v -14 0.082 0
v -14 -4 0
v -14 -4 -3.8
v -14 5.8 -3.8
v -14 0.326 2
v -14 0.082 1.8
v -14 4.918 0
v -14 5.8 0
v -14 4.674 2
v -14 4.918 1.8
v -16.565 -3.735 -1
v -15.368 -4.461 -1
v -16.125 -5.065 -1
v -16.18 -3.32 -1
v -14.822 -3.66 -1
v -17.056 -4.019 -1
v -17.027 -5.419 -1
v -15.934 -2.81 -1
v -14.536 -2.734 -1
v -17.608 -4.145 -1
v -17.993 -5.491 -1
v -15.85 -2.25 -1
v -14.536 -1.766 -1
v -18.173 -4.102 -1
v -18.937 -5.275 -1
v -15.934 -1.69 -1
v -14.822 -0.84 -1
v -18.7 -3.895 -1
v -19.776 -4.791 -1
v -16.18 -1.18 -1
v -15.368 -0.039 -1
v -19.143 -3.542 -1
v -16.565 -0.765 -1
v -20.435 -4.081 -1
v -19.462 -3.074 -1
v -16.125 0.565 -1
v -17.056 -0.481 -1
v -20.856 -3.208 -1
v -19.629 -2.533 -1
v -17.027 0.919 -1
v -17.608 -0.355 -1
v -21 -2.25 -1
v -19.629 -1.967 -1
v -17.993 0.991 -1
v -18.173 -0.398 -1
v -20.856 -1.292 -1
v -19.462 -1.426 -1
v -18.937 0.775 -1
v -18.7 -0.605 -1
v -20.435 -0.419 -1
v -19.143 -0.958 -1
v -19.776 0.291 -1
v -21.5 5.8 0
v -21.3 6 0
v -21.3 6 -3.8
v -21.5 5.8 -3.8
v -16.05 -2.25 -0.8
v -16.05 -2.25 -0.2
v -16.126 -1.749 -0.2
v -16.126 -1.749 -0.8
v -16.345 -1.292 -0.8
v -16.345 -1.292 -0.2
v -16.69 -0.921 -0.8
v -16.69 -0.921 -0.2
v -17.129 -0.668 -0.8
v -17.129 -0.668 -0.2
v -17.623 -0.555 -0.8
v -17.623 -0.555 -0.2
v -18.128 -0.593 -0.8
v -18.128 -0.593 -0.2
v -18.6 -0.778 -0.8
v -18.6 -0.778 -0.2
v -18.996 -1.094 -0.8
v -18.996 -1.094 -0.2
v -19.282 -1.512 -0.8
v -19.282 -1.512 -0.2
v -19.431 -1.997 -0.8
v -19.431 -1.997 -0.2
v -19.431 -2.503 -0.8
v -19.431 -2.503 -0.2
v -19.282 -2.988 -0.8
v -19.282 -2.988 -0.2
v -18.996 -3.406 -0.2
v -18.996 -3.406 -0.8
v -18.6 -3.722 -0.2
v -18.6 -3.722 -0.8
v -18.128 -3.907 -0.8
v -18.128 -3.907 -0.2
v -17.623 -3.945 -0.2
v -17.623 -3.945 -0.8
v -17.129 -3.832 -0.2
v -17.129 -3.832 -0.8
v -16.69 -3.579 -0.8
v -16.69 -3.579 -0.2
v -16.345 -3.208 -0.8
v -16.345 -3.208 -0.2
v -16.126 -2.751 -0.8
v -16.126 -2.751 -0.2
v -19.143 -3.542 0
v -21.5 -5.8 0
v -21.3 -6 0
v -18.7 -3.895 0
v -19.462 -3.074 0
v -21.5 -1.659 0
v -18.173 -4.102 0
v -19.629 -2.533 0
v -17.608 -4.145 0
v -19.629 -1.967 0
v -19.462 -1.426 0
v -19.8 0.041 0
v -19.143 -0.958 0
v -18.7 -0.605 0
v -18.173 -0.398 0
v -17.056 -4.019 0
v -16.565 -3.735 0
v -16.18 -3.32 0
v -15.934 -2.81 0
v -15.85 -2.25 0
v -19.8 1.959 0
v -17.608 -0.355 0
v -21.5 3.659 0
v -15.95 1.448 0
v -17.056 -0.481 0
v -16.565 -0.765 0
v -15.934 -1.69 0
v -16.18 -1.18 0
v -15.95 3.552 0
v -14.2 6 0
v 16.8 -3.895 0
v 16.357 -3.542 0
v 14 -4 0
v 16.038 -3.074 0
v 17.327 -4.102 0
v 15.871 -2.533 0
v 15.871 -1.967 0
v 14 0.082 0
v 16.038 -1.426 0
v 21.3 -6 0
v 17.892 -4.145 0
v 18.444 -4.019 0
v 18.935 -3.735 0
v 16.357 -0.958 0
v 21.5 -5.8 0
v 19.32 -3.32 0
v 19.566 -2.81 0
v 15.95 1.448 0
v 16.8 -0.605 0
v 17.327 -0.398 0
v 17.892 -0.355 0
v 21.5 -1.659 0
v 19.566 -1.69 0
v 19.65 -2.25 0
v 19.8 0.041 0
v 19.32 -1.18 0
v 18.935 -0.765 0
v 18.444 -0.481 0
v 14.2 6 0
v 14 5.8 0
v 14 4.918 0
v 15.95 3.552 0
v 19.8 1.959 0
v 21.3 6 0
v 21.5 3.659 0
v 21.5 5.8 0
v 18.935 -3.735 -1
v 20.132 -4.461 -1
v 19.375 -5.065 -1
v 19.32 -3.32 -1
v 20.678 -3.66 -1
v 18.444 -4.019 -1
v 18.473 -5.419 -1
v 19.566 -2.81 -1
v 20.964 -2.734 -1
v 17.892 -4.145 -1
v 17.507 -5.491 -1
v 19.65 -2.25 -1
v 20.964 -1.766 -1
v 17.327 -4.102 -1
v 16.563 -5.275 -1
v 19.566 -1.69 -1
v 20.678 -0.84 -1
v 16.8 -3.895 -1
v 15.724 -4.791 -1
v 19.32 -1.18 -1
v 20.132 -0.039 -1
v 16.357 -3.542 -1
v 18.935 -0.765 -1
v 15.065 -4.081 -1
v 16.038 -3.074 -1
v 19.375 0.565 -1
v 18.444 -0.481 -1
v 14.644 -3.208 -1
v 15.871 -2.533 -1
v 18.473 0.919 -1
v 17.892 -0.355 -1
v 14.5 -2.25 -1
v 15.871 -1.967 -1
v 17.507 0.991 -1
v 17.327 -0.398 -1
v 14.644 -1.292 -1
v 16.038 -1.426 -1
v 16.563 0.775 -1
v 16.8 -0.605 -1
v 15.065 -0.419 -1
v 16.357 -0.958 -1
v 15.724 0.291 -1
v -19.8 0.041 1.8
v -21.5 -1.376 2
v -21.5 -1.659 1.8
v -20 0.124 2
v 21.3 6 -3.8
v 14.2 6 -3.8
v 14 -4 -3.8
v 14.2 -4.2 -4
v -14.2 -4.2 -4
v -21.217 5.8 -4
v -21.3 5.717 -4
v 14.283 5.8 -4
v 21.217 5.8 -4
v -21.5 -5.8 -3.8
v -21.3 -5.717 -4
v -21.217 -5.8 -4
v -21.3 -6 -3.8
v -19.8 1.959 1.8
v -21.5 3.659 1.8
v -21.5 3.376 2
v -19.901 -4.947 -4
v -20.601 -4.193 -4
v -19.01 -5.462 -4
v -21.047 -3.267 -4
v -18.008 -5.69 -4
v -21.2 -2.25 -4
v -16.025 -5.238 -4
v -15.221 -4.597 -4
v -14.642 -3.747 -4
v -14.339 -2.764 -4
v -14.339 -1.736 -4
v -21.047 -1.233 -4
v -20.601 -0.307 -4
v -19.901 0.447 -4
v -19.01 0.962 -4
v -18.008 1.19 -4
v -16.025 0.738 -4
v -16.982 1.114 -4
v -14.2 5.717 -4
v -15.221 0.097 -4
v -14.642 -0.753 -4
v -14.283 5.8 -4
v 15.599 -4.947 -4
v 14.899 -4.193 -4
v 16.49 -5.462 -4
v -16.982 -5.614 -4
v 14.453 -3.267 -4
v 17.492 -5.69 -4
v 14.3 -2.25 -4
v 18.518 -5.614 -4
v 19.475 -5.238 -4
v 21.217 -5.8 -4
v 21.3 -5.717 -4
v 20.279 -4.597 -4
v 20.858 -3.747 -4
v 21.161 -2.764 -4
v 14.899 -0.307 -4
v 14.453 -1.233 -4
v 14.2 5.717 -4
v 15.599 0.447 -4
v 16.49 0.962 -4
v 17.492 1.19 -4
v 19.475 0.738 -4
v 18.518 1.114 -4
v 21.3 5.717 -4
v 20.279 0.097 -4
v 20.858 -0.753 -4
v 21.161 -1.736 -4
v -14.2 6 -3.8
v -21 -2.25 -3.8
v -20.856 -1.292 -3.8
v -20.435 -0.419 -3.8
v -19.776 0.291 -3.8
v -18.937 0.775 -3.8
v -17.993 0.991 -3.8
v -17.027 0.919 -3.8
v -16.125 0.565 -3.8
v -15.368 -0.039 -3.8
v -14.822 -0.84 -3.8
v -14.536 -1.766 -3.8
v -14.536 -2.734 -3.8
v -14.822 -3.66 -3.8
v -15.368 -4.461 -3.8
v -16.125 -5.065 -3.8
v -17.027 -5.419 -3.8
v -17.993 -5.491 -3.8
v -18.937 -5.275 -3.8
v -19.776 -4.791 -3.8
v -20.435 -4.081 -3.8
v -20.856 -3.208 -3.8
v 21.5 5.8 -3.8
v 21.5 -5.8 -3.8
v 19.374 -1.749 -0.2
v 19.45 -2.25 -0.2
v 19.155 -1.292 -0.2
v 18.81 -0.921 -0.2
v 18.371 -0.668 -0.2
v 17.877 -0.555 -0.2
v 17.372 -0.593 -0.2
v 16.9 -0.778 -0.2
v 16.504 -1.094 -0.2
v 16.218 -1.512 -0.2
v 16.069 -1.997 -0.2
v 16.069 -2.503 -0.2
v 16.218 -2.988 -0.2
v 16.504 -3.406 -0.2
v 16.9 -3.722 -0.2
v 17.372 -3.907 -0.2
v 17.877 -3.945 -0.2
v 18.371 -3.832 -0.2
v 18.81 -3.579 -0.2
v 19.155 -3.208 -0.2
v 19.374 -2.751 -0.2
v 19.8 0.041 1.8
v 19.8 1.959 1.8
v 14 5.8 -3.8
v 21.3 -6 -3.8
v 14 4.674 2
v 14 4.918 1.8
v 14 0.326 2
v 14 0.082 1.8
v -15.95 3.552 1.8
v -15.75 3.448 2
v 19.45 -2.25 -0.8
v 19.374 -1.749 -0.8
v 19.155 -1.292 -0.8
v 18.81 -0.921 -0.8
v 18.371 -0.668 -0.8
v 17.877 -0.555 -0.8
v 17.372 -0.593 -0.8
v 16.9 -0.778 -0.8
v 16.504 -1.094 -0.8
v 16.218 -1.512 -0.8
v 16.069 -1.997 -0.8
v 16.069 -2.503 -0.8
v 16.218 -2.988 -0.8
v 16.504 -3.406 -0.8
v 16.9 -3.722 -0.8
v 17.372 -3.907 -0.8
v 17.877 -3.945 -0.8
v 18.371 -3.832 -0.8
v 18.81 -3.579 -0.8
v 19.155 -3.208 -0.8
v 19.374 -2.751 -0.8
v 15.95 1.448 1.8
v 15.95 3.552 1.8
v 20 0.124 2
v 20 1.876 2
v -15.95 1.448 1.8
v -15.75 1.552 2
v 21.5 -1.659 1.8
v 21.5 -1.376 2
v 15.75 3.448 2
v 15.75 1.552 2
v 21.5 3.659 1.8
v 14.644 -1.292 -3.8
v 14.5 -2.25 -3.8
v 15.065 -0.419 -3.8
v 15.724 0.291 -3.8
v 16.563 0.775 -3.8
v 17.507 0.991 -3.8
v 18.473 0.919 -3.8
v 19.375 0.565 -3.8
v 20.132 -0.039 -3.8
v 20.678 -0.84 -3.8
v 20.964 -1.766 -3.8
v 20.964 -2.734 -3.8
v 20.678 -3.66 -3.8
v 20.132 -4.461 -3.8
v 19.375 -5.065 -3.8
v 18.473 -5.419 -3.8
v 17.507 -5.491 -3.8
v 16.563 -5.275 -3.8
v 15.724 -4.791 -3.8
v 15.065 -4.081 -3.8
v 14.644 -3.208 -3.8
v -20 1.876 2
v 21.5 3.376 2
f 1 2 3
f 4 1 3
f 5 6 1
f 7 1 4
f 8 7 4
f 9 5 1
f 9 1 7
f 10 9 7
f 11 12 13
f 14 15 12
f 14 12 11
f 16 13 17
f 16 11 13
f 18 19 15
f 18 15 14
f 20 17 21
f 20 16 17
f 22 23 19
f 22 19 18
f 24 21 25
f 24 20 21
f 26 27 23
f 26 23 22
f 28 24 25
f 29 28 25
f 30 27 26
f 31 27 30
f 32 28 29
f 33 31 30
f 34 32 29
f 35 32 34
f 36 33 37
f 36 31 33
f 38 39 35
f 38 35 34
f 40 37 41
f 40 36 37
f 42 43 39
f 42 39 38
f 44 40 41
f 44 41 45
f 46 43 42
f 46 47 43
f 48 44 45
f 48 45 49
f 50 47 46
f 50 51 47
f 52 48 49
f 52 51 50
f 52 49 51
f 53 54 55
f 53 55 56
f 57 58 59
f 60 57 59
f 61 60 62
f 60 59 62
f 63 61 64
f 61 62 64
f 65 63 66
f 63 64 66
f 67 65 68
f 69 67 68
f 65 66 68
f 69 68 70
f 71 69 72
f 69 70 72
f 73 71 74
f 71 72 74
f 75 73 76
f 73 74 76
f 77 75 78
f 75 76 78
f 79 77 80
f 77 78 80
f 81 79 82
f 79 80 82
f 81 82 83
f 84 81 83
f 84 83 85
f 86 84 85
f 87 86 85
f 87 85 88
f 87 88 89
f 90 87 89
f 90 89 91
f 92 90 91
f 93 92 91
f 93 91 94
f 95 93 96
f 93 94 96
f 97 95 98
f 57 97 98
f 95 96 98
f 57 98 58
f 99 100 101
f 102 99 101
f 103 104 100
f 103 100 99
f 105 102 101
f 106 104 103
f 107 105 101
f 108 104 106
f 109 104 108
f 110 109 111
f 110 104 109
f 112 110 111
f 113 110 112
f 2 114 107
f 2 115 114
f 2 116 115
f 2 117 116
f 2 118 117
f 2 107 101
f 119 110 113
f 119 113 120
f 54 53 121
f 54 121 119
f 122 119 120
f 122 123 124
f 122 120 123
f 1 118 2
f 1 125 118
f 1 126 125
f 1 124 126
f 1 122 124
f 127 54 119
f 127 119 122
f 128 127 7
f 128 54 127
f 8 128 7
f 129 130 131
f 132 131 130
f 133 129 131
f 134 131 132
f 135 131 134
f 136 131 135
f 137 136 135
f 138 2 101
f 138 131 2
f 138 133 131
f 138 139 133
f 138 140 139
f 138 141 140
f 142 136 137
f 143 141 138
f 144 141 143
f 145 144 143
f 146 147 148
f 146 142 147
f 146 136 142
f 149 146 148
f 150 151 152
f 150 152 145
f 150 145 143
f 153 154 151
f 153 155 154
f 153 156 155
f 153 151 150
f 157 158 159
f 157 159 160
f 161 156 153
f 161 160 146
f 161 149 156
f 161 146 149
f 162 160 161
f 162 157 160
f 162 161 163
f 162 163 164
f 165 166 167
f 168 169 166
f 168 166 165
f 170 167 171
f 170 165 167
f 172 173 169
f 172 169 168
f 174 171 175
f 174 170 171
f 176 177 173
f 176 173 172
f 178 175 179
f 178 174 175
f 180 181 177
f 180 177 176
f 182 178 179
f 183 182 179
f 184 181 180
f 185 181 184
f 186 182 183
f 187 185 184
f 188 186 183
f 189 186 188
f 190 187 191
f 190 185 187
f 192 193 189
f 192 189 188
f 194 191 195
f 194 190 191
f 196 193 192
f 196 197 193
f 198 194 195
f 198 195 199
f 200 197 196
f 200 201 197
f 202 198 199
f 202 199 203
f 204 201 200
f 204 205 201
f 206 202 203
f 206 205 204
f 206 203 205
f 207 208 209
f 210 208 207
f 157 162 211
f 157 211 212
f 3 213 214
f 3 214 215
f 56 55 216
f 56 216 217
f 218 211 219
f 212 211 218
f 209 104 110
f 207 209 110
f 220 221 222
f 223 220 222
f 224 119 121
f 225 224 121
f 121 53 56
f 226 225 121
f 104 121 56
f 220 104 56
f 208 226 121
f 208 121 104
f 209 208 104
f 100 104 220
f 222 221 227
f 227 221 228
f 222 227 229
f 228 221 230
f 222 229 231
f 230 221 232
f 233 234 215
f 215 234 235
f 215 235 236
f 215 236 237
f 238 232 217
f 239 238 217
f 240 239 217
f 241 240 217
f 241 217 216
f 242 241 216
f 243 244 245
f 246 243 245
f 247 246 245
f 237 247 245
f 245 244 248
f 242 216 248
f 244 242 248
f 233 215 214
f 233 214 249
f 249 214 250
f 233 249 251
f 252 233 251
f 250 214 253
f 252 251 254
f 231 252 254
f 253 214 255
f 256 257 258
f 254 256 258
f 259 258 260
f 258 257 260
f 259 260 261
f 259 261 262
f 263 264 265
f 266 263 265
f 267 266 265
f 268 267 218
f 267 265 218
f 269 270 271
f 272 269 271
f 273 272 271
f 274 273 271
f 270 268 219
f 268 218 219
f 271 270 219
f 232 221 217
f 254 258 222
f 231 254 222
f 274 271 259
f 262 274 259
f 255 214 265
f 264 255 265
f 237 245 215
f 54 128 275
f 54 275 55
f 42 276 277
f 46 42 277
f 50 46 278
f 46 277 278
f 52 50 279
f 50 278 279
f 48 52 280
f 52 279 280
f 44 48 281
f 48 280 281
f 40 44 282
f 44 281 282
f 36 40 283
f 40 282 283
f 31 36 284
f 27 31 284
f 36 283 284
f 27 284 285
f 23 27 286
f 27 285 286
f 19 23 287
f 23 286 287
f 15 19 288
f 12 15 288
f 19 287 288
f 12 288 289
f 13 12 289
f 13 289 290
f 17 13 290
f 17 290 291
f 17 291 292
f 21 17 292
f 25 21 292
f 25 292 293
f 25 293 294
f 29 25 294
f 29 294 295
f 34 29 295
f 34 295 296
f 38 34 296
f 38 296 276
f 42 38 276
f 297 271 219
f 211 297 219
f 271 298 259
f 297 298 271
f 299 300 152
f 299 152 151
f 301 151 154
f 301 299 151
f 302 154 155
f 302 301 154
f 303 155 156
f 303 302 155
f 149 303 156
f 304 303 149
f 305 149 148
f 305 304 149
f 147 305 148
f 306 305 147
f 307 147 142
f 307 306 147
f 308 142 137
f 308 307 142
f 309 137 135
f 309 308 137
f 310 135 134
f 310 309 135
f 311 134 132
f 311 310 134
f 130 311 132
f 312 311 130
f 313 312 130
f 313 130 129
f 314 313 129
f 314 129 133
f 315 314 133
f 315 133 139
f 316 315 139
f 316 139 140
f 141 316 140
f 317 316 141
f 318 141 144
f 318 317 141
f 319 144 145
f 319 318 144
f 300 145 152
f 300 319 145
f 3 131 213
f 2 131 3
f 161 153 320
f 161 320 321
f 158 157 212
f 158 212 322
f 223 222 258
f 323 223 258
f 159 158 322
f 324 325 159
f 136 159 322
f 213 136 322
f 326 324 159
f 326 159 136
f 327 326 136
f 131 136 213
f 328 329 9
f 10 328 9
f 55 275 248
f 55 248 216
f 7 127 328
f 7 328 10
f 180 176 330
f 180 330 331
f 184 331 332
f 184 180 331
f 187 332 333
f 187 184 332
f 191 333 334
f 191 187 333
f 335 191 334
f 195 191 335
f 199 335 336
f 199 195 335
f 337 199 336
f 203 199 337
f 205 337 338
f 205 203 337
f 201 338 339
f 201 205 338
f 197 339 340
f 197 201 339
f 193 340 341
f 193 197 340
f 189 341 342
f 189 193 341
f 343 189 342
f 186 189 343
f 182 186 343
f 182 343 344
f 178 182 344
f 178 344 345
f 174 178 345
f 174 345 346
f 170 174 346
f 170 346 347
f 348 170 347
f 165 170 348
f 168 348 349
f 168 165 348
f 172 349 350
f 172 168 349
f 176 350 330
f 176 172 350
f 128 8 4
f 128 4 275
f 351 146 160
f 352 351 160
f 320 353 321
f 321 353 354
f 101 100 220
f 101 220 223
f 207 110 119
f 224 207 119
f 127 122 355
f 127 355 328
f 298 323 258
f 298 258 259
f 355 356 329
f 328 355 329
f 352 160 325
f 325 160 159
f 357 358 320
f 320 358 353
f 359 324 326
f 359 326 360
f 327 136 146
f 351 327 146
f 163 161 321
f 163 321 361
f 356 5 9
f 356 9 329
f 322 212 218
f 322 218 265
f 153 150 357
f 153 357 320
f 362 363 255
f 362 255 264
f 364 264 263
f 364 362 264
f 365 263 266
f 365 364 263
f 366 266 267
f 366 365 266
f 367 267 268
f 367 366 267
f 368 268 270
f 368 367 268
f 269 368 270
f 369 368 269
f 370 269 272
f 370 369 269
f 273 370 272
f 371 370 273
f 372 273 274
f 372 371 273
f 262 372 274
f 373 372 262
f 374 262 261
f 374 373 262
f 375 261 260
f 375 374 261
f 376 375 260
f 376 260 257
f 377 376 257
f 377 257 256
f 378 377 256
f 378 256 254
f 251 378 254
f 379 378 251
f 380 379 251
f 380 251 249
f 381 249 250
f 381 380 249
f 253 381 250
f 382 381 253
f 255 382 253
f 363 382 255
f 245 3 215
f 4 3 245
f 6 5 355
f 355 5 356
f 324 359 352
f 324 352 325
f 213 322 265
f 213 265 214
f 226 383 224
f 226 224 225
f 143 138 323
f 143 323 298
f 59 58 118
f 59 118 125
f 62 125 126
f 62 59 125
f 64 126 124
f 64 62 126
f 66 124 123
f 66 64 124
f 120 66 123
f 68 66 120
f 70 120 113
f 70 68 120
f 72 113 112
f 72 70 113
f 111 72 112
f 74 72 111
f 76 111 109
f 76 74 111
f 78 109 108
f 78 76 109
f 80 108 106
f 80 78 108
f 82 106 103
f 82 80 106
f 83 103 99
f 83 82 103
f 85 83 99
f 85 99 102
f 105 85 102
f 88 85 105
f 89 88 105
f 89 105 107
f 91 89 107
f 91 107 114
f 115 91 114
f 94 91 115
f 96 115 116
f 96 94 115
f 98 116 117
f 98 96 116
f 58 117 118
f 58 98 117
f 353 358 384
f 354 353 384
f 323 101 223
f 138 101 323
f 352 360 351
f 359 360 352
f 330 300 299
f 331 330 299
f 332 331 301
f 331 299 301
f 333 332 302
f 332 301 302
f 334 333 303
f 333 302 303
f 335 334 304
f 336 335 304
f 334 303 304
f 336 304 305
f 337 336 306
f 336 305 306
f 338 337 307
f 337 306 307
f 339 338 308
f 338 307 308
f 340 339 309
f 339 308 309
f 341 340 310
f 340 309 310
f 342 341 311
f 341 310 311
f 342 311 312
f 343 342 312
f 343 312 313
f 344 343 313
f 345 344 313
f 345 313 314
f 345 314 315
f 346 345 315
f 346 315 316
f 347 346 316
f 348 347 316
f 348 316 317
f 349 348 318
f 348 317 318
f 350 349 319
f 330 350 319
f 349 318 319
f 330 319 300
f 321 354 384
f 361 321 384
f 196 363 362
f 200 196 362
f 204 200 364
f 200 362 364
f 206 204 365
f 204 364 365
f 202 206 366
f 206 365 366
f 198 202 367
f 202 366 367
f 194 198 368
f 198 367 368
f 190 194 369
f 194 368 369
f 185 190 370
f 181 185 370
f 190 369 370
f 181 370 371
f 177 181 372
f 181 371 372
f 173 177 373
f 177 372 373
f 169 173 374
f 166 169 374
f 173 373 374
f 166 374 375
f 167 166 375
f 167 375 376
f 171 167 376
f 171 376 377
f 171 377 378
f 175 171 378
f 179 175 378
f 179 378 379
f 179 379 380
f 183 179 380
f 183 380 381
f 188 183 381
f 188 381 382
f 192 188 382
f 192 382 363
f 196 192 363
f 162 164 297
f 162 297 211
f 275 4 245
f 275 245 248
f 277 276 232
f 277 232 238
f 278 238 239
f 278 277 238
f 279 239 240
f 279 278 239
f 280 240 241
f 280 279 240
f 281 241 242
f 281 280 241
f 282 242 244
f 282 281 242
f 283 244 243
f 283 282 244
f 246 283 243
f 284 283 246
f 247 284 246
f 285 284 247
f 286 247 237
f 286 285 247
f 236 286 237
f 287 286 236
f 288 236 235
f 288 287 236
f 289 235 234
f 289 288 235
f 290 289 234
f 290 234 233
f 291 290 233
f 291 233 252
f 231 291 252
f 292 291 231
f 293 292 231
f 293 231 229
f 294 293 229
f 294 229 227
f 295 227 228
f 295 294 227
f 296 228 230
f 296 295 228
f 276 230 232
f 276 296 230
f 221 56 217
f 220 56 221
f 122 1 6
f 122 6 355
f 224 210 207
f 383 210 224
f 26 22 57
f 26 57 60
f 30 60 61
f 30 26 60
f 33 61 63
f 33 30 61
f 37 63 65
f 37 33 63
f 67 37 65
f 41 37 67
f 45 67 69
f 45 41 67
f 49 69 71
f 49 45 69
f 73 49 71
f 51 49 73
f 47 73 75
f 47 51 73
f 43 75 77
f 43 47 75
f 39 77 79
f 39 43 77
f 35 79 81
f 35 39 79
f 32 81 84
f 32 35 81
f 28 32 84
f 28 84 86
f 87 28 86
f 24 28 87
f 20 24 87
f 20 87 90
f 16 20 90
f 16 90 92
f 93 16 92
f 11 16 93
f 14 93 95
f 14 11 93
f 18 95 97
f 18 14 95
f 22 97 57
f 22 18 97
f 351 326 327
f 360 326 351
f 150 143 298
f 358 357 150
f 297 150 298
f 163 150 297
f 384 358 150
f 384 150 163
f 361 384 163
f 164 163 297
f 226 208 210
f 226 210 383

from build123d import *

# Parameters (mm, degrees)
BOSS_EXTRUDE1_DEPTH            = 4
SLOT_ALIGNER_DEPTH             = 2
ALIGNER_DEPTH                  = 2
DEBURS_SIZE                    = 0.2
CBORE_FOR_M3_SHCS1_D           = 3.4
CBORE_FOR_M3_SHCS1_CBORE_D     = 6.5
CBORE_FOR_M3_SHCS1_CBORE_DEPTH = 3
CHAMFER1_SIZE                  = 0.2


with BuildPart() as part:
    # Sketch1 → Boss-Extrude1 (new body)
    with BuildSketch(Plane.XY):
        Polygon((-21.3, -6), (21.3, -6), (21.5, -5.8), (21.5, 5.8), (21.3, 6), (14.2, 6), (14, 5.8), (14, -4), (-14, -4), (-14, 5.8), (-14.2, 6), (-21.3, 6), (-21.5, 5.8), (-21.5, -5.8), align=None)
    extrude(amount=-BOSS_EXTRUDE1_DEPTH)

    # Sketch3 → Slot Aligner (add)
    with BuildSketch(Plane.XY):
        Polygon((15.95, 3.552468642), (14, 4.917873342), (14, 0.082126658), (15.95, 1.447531358), align=None)
    slot_aligner = extrude(amount=SLOT_ALIGNER_DEPTH)

    # Mirror3: Slot Aligner across plane
    add(slot_aligner.mirror(Plane(origin=(0, 0, 0), x_dir=(0, 0, 1), z_dir=(1, 0, 0))))

    # Sketch4 → Aligner (add)
    with BuildSketch(Plane(origin=(0, 0, 0), x_dir=(-1, 0, 0), z_dir=(0, 0, -1))):
        Polygon((-19.8, 1.958578644), (-21.4, 3.558578644), (-21.5, 3.658578644), (-21.5, -1.658578644), (-21.4, -1.558578644), (-19.8, 0.041421356), align=None)
    aligner = extrude(amount=-ALIGNER_DEPTH)

    # Aligners: Aligner across plane
    add(aligner.mirror(Plane(origin=(0, 0, 0), x_dir=(0, 0, 1), z_dir=(1, 0, 0))))

    # Deburs
    deburs_edges = [part.edges().sort_by_distance(p)[0] for p in [
        (-14.1, 5.9, -4),
        (-17.75, 6, -4),
        (-21.4, 5.9, -4),
        (-21.5, 0, -4),
        (-21.4, -5.9, -4),
        (0, -6, -4),
        (21.4, -5.9, -4),
        (21.5, 0, -4),
        (21.4, 5.9, -4),
        (15.95, 2.5, 2),
        (14.975, 4.235170992, 2),
        (14.975, 0.764829008, 2),
        (17.75, 6, -4),
        (0, -4, -4),
        (14.1, 5.9, -4),
        (14, 0.9, -4),
        (-15.95, 2.5, 2),
        (-14.975, 0.764829008, 2),
        (-14.975, 4.235170992, 2),
        (19.8, 1, 2),
        (20.65, -0.808578644, 2),
        (20.65, 2.808578644, 2),
        (-19.8, 1, 2),
        (-20.65, 2.808578644, 2),
        (-20.65, -0.808578644, 2),
        (-14, 0.9, -4),
    ]]
    chamfer(deburs_edges, length=DEBURS_SIZE)

    # CBORE for M3 SHCS1 (through all)
    with Locations(Plane(origin=(0, 0, -4), x_dir=(-1, 0, 0), z_dir=(0, 0, -1))):
        with Locations((-17.75, -2.25), (17.75, -2.25)):
            CounterBoreHole(CBORE_FOR_M3_SHCS1_D / 2, CBORE_FOR_M3_SHCS1_CBORE_D / 2, CBORE_FOR_M3_SHCS1_CBORE_DEPTH)

    # Chamfer1
    chamfer1_edges = [part.edges().sort_by_distance(p)[0] for p in [
        (-19.45, -2.25, 0),
        (-14.5, -2.25, -4),
        (-19.45, -2.25, -1),
        (16.05, -2.25, 0),
        (21, -2.25, -4),
        (16.05, -2.25, -1),
    ]]
    chamfer(chamfer1_edges, length=CHAMFER1_SIZE)


solid = part.part
